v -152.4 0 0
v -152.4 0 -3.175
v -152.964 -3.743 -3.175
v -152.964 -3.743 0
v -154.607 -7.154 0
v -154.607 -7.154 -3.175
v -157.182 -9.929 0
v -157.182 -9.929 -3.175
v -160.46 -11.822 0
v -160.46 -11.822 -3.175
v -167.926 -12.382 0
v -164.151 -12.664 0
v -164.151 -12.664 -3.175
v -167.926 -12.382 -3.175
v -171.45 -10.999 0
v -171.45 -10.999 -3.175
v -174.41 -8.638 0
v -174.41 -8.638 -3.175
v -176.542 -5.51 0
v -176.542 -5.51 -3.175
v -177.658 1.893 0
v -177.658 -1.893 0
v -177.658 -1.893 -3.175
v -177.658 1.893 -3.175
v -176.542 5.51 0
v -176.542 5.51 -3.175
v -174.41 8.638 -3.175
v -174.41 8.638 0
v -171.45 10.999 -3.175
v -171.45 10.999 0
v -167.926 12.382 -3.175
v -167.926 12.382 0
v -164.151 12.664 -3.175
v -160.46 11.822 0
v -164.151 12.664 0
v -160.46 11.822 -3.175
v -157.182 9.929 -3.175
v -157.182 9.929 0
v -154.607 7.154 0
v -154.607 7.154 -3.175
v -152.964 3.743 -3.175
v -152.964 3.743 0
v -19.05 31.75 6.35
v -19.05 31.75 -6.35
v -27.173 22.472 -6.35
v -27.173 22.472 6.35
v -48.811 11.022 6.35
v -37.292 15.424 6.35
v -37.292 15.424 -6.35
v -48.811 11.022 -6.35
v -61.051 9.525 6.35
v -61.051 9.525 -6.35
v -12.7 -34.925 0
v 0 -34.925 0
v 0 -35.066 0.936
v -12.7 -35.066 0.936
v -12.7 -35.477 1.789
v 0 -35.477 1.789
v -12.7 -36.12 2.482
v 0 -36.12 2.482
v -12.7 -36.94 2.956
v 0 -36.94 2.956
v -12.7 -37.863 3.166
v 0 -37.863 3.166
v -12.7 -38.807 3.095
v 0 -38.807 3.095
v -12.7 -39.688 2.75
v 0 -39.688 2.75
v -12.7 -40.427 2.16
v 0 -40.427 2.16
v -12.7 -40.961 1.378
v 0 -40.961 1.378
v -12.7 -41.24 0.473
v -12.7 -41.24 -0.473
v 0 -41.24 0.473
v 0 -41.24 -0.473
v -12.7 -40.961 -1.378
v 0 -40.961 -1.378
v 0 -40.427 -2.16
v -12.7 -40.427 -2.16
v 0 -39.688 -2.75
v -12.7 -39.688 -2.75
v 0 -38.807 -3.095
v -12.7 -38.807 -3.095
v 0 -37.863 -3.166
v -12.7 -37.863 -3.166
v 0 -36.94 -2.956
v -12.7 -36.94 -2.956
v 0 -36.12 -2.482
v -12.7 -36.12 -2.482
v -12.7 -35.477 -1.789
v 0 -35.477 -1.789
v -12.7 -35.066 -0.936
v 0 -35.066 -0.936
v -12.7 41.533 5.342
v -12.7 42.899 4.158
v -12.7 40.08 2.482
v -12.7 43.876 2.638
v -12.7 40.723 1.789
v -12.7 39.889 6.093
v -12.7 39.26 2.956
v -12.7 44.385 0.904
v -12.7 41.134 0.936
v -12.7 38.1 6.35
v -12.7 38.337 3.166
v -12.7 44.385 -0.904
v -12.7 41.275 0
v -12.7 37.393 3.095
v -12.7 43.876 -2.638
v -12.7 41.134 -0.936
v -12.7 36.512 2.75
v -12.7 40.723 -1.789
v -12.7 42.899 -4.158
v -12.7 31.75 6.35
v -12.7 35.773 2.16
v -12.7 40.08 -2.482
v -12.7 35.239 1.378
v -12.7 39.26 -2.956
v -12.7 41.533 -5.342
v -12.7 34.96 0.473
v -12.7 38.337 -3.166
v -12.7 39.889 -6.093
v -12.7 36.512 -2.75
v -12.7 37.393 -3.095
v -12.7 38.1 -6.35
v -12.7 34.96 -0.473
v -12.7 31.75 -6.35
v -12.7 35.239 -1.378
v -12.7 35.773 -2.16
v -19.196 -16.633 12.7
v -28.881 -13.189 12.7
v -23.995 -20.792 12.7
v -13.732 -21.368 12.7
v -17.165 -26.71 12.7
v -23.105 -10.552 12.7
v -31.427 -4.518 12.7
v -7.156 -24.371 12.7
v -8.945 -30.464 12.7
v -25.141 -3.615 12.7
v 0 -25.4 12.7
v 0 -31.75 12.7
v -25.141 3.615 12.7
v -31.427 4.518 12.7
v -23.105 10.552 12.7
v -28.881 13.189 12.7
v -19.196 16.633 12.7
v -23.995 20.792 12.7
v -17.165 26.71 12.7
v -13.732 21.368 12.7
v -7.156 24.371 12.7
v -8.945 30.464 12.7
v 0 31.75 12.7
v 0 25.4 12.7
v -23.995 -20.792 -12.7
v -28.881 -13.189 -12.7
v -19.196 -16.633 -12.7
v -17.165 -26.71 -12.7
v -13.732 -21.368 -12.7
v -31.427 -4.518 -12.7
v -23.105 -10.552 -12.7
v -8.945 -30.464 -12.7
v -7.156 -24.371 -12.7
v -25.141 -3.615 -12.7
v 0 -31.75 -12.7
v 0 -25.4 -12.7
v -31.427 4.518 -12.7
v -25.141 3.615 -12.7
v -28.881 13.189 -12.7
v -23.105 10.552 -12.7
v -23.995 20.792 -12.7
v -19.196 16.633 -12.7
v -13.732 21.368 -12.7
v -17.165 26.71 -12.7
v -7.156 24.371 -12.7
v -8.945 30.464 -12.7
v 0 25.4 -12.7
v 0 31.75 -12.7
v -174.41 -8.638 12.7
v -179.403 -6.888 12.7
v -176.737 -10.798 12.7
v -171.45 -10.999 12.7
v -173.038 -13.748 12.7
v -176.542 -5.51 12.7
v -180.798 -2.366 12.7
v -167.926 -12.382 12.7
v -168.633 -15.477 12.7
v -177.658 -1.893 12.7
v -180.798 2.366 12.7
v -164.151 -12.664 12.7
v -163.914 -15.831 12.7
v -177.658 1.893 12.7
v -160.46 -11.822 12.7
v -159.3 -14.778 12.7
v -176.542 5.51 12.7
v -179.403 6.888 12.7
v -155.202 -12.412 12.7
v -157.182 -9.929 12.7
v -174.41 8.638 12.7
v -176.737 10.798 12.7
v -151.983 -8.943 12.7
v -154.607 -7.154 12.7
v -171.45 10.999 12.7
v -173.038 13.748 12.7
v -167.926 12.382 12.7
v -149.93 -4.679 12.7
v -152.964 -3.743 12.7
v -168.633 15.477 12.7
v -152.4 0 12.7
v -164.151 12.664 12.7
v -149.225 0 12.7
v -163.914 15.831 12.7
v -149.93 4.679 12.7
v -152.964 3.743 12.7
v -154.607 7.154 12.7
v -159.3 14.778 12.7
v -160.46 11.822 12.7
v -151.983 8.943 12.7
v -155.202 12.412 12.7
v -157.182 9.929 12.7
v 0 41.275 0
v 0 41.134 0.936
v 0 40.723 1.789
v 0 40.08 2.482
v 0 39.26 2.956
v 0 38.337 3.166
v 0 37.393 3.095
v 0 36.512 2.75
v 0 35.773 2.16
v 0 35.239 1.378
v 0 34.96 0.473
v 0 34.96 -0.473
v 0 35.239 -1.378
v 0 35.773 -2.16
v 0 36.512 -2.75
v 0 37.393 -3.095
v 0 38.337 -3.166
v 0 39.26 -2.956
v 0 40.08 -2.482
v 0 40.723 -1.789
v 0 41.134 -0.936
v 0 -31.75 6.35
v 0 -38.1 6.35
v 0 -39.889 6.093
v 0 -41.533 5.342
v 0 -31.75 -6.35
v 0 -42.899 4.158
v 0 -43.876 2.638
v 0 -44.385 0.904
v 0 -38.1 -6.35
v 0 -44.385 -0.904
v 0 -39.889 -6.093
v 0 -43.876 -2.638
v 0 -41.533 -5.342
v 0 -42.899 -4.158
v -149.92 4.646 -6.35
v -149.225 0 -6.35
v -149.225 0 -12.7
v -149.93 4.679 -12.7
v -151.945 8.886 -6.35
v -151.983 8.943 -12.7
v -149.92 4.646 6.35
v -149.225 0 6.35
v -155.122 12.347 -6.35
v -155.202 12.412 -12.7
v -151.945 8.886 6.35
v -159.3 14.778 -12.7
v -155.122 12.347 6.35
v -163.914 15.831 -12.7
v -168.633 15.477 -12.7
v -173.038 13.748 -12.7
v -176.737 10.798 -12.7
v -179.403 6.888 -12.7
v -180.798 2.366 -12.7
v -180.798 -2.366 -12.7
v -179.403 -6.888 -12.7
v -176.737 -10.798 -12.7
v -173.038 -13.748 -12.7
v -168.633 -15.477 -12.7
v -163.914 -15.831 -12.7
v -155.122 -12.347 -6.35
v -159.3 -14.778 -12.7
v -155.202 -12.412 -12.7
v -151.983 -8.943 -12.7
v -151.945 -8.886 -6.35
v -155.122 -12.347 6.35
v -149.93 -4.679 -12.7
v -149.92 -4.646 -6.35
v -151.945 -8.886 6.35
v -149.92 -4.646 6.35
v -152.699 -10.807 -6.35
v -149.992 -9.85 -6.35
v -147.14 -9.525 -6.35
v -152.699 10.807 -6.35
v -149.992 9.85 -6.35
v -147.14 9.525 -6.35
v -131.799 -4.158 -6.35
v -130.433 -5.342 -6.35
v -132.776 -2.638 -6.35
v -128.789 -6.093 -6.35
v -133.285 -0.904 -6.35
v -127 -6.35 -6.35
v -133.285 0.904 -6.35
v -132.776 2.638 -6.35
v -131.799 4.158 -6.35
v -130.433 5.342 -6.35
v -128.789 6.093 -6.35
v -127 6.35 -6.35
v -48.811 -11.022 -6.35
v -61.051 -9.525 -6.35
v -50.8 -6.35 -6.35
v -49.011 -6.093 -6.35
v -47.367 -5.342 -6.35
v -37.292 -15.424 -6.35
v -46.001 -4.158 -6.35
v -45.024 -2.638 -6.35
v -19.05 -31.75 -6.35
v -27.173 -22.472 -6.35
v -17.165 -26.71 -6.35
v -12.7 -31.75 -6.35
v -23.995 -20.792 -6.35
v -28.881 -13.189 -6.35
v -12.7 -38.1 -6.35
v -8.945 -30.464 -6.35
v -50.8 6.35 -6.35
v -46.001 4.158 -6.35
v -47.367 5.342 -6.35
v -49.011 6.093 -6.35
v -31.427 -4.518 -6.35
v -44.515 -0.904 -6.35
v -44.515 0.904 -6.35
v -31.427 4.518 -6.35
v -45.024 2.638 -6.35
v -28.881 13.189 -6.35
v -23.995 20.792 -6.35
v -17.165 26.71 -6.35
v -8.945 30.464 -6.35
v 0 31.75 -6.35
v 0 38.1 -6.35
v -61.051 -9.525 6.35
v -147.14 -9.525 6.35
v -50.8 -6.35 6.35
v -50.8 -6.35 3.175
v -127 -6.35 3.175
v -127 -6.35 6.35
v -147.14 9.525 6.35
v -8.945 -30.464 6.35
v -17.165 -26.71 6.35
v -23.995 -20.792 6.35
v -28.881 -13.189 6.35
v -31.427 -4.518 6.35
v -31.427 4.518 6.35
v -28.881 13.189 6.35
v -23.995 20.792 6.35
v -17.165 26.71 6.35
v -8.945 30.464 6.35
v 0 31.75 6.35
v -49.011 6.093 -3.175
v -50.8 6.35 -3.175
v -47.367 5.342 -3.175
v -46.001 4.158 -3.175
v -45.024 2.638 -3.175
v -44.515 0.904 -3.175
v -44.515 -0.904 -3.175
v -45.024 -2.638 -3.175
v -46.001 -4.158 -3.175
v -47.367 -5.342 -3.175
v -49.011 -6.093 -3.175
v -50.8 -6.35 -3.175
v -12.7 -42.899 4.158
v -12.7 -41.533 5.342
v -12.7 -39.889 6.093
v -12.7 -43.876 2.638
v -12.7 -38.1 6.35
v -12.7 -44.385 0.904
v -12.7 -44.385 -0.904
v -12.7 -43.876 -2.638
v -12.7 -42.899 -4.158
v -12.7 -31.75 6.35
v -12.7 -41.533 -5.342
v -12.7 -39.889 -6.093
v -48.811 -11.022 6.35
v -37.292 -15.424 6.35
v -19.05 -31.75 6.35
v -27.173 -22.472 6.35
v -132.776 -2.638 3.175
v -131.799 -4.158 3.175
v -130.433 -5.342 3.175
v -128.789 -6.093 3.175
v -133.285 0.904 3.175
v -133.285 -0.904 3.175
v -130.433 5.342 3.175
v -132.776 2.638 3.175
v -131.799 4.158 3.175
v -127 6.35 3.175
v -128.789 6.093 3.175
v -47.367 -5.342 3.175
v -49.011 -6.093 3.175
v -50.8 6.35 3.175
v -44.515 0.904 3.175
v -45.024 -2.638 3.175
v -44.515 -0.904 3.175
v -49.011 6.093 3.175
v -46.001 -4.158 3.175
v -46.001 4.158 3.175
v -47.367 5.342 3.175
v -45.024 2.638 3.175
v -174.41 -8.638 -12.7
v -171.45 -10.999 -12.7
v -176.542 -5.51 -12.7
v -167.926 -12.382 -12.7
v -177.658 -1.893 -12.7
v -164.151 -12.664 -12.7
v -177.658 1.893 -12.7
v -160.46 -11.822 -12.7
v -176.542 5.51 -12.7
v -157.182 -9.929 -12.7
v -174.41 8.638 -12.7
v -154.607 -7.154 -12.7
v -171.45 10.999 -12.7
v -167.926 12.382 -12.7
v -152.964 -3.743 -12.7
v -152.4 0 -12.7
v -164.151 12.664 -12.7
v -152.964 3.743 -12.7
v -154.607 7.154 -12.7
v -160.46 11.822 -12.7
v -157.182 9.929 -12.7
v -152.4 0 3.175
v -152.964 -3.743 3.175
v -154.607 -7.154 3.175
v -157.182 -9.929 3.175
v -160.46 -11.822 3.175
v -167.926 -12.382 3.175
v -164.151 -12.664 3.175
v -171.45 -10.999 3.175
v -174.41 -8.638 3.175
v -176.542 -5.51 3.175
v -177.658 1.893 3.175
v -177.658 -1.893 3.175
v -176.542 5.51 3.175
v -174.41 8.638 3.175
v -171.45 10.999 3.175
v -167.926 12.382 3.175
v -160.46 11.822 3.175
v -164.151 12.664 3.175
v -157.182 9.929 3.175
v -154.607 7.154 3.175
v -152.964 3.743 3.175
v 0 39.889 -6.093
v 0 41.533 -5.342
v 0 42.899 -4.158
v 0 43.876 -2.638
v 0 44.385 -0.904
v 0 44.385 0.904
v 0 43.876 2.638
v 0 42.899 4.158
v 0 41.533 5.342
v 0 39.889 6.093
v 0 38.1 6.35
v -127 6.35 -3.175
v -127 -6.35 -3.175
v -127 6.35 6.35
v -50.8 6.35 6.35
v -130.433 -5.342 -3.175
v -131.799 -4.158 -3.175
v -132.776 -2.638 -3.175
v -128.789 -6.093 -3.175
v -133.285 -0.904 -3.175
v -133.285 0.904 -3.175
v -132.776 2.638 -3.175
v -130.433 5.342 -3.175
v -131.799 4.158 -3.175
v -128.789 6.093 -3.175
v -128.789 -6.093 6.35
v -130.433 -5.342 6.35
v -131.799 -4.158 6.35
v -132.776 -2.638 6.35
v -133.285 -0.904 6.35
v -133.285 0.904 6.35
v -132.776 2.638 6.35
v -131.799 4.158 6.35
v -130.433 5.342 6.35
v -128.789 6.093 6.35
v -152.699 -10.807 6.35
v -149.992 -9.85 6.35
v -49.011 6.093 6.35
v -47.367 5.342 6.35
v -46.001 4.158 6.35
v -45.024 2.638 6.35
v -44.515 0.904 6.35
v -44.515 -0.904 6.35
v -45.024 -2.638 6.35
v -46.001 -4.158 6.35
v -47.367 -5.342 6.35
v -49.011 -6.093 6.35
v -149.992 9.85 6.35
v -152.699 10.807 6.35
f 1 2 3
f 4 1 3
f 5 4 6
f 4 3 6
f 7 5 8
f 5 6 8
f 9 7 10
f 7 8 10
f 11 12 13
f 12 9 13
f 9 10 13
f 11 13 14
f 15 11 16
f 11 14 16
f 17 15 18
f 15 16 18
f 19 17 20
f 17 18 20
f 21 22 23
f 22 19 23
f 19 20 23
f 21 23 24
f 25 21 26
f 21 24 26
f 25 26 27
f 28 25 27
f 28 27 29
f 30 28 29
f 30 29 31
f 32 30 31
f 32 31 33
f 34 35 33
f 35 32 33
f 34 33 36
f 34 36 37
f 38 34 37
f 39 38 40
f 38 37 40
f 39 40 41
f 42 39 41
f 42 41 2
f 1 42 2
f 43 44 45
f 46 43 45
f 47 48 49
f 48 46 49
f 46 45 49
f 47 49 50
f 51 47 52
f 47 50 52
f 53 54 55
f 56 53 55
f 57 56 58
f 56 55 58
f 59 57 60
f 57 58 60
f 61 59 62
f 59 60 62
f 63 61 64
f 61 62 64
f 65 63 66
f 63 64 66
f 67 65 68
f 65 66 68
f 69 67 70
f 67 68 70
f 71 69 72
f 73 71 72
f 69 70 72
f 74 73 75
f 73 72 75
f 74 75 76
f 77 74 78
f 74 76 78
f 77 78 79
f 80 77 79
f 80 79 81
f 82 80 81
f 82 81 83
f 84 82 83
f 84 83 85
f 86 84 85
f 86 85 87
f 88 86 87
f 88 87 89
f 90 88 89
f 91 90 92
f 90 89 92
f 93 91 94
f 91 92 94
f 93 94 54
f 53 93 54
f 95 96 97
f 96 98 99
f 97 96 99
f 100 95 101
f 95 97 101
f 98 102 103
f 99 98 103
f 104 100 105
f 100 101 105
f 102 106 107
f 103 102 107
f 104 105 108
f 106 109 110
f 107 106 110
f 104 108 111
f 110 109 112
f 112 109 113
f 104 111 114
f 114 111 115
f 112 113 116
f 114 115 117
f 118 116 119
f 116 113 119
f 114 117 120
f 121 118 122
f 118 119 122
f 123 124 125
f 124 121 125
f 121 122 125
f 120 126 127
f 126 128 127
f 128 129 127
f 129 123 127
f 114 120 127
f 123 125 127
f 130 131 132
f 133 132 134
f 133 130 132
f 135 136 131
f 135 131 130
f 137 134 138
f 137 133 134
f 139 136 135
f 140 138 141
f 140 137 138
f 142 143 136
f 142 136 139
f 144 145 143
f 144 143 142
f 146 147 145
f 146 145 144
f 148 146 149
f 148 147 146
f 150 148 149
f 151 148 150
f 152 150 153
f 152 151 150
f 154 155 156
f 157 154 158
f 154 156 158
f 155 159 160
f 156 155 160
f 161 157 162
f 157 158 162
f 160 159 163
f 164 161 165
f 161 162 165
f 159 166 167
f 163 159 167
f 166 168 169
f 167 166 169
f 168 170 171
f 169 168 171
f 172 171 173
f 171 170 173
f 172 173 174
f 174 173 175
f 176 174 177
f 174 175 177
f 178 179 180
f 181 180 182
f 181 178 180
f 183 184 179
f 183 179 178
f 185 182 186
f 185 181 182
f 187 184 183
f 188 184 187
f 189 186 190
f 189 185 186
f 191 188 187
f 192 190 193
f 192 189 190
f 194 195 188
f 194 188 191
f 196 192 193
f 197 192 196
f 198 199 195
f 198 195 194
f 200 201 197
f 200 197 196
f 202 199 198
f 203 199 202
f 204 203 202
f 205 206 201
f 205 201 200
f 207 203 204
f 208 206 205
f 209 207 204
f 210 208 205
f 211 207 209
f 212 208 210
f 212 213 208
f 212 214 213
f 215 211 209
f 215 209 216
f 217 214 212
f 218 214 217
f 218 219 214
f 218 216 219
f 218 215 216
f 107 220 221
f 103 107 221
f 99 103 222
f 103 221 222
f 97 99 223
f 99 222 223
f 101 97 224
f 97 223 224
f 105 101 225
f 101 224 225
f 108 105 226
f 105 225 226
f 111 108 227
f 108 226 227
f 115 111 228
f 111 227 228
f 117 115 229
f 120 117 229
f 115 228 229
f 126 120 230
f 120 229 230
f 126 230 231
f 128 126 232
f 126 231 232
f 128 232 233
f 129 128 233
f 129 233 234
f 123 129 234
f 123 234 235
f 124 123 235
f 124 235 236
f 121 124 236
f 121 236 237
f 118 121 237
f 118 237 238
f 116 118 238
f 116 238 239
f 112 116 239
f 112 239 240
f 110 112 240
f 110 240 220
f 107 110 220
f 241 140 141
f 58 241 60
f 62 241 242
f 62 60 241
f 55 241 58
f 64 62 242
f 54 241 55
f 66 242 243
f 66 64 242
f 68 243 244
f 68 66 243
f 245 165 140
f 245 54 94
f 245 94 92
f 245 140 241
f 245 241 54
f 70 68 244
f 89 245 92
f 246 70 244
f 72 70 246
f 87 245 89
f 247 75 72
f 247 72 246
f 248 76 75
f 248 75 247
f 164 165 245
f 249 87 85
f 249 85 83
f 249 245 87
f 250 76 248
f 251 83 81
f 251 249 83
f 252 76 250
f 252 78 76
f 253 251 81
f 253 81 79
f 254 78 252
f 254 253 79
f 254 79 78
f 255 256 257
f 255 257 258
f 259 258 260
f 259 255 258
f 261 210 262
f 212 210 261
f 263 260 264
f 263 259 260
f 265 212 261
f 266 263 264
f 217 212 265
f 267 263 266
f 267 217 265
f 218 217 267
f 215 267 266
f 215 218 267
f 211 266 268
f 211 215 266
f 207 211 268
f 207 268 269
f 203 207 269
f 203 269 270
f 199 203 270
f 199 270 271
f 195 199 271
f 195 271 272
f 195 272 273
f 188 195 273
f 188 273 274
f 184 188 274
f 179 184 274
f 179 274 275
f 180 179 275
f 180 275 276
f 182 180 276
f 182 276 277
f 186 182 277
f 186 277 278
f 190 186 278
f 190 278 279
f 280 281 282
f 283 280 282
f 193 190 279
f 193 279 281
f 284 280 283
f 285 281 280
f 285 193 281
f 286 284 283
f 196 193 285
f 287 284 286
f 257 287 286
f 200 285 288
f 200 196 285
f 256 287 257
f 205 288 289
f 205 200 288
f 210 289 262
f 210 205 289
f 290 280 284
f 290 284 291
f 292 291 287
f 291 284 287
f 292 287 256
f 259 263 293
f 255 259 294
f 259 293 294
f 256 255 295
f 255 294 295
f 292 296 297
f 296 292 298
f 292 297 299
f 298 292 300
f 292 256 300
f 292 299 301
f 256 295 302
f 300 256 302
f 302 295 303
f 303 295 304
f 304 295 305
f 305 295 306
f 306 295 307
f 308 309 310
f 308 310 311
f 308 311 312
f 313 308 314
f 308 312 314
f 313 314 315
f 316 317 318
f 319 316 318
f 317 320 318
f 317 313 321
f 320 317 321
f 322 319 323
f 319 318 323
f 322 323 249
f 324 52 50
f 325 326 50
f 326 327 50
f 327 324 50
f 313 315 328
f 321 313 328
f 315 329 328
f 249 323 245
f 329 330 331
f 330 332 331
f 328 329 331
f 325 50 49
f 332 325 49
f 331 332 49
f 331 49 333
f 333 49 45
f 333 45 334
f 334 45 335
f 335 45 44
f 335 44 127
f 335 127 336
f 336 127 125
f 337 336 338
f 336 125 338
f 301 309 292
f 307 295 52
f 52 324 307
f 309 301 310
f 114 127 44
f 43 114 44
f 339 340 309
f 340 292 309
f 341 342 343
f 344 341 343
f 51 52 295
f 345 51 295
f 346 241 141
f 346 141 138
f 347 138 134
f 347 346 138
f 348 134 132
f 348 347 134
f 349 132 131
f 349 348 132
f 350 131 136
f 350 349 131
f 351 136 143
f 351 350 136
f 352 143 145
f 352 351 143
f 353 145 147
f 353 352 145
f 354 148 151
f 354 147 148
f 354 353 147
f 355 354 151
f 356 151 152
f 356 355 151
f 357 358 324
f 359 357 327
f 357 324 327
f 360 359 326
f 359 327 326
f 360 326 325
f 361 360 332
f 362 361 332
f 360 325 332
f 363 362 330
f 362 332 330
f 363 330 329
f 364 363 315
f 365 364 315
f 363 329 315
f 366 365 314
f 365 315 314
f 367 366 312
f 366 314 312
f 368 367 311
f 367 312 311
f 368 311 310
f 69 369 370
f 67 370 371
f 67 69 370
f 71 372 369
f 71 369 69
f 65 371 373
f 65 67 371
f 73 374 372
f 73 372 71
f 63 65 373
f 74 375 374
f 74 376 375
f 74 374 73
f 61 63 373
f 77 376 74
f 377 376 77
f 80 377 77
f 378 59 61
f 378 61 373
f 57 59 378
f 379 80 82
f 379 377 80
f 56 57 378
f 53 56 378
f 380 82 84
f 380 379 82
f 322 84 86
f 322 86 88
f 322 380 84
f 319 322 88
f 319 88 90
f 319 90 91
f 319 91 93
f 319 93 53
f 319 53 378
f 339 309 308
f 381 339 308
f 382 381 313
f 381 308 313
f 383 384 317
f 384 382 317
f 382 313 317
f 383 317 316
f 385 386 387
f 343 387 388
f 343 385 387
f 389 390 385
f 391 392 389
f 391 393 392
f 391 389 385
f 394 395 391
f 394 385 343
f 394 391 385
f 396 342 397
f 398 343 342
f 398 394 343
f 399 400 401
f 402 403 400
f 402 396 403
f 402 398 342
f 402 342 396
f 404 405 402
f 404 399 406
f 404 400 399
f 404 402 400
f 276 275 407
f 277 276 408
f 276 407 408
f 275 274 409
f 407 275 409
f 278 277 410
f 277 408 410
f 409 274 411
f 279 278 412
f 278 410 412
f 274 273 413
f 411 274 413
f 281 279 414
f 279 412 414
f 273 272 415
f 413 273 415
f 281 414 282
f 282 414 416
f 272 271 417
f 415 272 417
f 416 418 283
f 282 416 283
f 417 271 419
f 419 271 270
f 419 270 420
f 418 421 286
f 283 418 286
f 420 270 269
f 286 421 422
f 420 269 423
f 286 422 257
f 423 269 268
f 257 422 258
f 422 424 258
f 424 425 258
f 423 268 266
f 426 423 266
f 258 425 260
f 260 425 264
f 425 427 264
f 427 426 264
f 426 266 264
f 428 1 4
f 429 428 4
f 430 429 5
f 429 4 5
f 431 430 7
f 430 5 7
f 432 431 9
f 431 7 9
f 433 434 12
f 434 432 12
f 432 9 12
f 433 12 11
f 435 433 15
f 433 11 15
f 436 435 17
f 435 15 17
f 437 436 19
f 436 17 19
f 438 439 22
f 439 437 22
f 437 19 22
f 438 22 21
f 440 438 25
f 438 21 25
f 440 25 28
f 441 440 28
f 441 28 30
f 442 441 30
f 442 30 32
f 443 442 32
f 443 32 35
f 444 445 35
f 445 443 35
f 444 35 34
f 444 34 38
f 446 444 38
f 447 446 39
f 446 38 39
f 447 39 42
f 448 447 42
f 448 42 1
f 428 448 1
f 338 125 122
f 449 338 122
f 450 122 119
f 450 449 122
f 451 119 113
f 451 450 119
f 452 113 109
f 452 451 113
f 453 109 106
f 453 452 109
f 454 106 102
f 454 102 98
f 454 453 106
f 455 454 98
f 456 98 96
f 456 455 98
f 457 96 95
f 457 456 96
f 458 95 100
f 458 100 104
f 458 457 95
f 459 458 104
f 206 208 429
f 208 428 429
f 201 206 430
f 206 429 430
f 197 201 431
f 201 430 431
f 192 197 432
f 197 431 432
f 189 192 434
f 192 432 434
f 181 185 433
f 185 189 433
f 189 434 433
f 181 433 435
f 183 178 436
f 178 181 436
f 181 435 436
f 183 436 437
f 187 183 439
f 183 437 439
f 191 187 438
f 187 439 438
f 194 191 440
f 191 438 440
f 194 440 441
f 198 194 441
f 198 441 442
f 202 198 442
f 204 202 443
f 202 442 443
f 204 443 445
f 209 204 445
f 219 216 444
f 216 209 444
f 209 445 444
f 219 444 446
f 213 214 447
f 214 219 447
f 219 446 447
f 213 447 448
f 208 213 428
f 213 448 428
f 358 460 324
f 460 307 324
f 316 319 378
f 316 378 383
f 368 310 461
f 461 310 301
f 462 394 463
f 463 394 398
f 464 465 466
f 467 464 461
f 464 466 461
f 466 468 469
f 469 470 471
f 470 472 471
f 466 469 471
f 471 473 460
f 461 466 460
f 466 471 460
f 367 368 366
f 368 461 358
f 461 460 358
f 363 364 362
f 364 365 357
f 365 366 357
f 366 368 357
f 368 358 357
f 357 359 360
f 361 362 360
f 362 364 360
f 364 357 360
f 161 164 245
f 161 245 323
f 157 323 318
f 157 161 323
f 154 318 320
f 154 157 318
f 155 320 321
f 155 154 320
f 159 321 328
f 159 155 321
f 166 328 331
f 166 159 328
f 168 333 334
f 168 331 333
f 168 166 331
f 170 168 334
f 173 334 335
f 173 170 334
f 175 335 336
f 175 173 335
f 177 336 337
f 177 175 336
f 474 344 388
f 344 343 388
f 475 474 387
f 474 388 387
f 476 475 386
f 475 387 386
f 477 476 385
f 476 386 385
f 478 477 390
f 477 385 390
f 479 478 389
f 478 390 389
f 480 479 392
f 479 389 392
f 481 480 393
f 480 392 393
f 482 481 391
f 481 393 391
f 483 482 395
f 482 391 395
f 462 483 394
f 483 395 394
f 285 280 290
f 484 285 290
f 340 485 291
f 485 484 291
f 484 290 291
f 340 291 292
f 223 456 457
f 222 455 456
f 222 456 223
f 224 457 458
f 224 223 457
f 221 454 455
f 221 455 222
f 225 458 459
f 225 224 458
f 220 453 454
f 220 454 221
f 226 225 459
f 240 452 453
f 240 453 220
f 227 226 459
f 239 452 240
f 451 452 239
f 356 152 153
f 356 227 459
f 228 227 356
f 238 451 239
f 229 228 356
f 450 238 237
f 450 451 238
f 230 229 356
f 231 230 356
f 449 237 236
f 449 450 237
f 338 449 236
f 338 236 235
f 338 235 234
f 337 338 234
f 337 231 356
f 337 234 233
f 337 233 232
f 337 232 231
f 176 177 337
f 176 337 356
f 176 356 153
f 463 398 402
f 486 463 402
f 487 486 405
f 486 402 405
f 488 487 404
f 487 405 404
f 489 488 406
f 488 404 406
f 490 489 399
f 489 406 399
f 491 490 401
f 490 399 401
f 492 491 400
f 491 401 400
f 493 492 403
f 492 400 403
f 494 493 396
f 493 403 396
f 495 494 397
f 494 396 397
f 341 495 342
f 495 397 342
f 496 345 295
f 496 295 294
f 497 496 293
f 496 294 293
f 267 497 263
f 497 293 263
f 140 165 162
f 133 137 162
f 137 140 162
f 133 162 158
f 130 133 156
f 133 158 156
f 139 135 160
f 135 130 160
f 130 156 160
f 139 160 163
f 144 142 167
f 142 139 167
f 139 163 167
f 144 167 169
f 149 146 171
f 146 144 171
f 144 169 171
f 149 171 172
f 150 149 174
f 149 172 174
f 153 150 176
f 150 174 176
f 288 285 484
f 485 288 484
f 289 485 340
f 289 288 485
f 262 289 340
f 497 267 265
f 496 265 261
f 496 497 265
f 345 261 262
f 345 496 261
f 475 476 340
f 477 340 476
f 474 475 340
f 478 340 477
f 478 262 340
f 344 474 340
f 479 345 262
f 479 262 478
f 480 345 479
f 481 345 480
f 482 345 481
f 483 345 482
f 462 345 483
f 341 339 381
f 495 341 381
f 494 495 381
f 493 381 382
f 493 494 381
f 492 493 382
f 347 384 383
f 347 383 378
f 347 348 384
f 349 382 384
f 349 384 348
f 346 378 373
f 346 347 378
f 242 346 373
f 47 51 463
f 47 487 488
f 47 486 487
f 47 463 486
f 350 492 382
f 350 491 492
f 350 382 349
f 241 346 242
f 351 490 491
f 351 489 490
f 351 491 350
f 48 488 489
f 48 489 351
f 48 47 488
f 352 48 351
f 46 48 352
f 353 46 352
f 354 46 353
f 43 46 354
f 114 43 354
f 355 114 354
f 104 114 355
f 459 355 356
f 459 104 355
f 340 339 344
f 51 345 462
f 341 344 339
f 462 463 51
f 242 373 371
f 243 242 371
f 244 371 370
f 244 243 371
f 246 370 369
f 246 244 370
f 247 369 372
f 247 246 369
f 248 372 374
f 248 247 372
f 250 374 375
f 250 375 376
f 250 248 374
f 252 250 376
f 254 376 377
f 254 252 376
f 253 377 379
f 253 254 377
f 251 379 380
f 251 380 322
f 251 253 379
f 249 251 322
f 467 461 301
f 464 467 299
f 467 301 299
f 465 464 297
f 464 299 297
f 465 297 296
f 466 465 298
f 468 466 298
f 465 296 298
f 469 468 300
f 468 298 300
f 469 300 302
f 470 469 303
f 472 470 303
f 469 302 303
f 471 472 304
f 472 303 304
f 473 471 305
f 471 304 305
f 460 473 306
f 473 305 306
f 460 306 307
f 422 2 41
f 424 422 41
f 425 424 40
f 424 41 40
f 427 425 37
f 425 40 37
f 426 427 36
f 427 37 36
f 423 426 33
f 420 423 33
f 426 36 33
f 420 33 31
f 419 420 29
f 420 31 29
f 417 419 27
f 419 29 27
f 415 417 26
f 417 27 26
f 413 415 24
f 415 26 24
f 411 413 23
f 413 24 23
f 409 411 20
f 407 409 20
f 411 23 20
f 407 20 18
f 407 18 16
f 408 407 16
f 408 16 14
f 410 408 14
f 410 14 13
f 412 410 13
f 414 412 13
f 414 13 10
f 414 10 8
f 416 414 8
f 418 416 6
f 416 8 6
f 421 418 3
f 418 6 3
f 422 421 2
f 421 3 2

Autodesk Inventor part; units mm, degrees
ref_plane "YZ Plane" through (0, 0, 0) normal (1, 0, 0) x (0, 1, 0)
ref_plane "XZ Plane" through (0, 0, 0) normal (0, 1, 0) x (-1, 0, 0)
ref_plane "XY Plane" through (0, 0, 0) normal (0, 0, 1) x (1, 0, 0)
sketch "Sketch1" plane through (0, 0, 0) normal (0, 0, 1) x (1, 0, 0)
  arc A0 (0, 25.4) -> (0, -25.4) centre (0, 0) ccw
  arc A1 (0, 31.75) -> (0, -31.75) centre (0, 0) ccw
  line L0 (0, 31.75) -> (0, 25.4)
  line L1 (0, 7.578) -> (0, -31.75)
  line L2 (0, 31.75) -> (0, 38.1)
  line L3 (0, 38.1) -> (-12.7, 38.1)
  line L4 (-12.7, 38.1) -> (-12.7, 31.75)
  line L5 (-12.7, 31.75) -> (-19.05, 31.75)
  line L6 (0, -31.75) -> (0, -38.1)
  line L7 (0, -38.1) -> (-12.7, -38.1)
  line L8 (-12.7, -38.1) -> (-12.7, -31.75)
  line L9 (-12.7, -31.75) -> (-19.05, -31.75)
  line L10 (-61.0513, 9.525) -> (-147.1395, 9.525)
  circle A2 centre (-165.1, 0) radius 12.7
  circle A3 centre (-165.1, 0) radius 15.875
  line L11 (-147.1395, -9.525) -> (-61.0513, -9.525)
  arc A4 (-19.05, -31.75) -> (-61.0513, -9.525) centre (-61.0513, -60.325) ccw
  arc A5 (-61.0513, 9.525) -> (-19.05, 31.75) centre (-61.0513, 60.325) ccw
  arc A6 (-155.1219, 12.3472) -> (-147.1395, 9.525) centre (-147.1395, 22.225) ccw
  arc A7 (-147.1395, -9.525) -> (-155.1219, -12.3472) centre (-147.1395, -22.225) ccw
  line L12 (-127, 0) -> (-50.8, 0) construction
  line L13 (-127, 6.35) -> (-50.8, 6.35)
  line L14 (-50.8, -6.35) -> (-127, -6.35)
  arc A8 (-127, 6.35) -> (-127, -6.35) centre (-127, 0) ccw
  arc A9 (-50.8, -6.35) -> (-50.8, 6.35) centre (-50.8, 0) ccw
  line L15 (0, -25.4) -> (0, -31.75)
  line L16 (0, 31.75) -> (0, 25.4)
  point P0 (-88.9, 0)
  dimension "d0" = 165.1
  dimension "d1" = 25.4
  dimension "d2" = 31.75
  dimension "d3" = 76.2
  dimension "d4" = 50.8
  dimension "d5" = 50.8
  dimension "d6" = 12.7
  dimension "d7" = 12.7
  dimension "d8" = 31.75
  dimension "d9" = 25.4
  dimension "d10" = 6.35
  dimension "d11" = 6.35
  dimension "d12" = 12.7
  dimension "d14" = 19.05
  dimension "d16" = 19.05
  dimension "d17" = 9.525
  dimension "d18" = 38.1
  dimension "d21" = 19.05
  dimension "d22" = 12.7
  dimension "d23" = 76.2
  dimension "d24" = 50.8
  dimension "d37" = 0
extrude "Extrusion1" add sketch "Sketch1" along normal mid plane 6.35 contours A0 L1 A1 L0 | A1 L6 L7 L8 L9 A4 L11 A7 A3 A6 L10 A5 L5 L4 L3 L2 | A3 | L13 A9 L14 A8
extrude "Extrusion2" add sketch "Sketch1" along normal mid plane 25.4 contours A0 L1 A1 L0 | A3
extrude "Extrusion3" add sketch "Sketch1" along normal mid plane 12.7 contours A1 L6 L7 L8 L9 A4 L11 A7 A3 A6 L10 A5 L5 L4 L3 L2
sketch "Sketch2" plane through (0, 0, 0) normal (1, 0, 0) x (0, 1, 0)
  line L0 (38.1, -6.35) -> (38.1, 6.35) projected
  circle A0 centre (38.1, 0) radius 3.175
  circle A1 centre (-38.1, 0) radius 3.175
  arc A2 (38.1, -6.35) -> (38.1, 6.35) centre (38.1, 0) ccw
  arc A3 (-38.1, 6.35) -> (-38.1, -6.35) centre (-38.1, 0) ccw
  line L1 (38.1, 6.35) -> (38.1, -6.35)
  line L2 (-38.1, 6.35) -> (-38.1, -6.35)
  line L3 (-38.1, -6.35) -> (-38.1, 6.35) projected
  point P0 (0, 0)
  dimension "d31" = 6.35
  dimension "d32" = 6.35
extrude "Extrusion4" add sketch "Sketch2" against normal blind 12.7 contours L0 A0 A2 | L0 A0 | L2 A1 | A1 L2 A3 picked at (40.0502, 0.2355) picked at (-38.971, -0.6012)
extrude "Extrusion5" cut sketch "Sketch2" against normal blind 12.7 contours A0 L0 | L0 A0 | A1 L2 | L2 A1
equation "\"d17\" = 0.5 * d16"
equation "\"d32\" = d31"
properties part number "HW 7 Part 3" material "Steel, Carbon"
